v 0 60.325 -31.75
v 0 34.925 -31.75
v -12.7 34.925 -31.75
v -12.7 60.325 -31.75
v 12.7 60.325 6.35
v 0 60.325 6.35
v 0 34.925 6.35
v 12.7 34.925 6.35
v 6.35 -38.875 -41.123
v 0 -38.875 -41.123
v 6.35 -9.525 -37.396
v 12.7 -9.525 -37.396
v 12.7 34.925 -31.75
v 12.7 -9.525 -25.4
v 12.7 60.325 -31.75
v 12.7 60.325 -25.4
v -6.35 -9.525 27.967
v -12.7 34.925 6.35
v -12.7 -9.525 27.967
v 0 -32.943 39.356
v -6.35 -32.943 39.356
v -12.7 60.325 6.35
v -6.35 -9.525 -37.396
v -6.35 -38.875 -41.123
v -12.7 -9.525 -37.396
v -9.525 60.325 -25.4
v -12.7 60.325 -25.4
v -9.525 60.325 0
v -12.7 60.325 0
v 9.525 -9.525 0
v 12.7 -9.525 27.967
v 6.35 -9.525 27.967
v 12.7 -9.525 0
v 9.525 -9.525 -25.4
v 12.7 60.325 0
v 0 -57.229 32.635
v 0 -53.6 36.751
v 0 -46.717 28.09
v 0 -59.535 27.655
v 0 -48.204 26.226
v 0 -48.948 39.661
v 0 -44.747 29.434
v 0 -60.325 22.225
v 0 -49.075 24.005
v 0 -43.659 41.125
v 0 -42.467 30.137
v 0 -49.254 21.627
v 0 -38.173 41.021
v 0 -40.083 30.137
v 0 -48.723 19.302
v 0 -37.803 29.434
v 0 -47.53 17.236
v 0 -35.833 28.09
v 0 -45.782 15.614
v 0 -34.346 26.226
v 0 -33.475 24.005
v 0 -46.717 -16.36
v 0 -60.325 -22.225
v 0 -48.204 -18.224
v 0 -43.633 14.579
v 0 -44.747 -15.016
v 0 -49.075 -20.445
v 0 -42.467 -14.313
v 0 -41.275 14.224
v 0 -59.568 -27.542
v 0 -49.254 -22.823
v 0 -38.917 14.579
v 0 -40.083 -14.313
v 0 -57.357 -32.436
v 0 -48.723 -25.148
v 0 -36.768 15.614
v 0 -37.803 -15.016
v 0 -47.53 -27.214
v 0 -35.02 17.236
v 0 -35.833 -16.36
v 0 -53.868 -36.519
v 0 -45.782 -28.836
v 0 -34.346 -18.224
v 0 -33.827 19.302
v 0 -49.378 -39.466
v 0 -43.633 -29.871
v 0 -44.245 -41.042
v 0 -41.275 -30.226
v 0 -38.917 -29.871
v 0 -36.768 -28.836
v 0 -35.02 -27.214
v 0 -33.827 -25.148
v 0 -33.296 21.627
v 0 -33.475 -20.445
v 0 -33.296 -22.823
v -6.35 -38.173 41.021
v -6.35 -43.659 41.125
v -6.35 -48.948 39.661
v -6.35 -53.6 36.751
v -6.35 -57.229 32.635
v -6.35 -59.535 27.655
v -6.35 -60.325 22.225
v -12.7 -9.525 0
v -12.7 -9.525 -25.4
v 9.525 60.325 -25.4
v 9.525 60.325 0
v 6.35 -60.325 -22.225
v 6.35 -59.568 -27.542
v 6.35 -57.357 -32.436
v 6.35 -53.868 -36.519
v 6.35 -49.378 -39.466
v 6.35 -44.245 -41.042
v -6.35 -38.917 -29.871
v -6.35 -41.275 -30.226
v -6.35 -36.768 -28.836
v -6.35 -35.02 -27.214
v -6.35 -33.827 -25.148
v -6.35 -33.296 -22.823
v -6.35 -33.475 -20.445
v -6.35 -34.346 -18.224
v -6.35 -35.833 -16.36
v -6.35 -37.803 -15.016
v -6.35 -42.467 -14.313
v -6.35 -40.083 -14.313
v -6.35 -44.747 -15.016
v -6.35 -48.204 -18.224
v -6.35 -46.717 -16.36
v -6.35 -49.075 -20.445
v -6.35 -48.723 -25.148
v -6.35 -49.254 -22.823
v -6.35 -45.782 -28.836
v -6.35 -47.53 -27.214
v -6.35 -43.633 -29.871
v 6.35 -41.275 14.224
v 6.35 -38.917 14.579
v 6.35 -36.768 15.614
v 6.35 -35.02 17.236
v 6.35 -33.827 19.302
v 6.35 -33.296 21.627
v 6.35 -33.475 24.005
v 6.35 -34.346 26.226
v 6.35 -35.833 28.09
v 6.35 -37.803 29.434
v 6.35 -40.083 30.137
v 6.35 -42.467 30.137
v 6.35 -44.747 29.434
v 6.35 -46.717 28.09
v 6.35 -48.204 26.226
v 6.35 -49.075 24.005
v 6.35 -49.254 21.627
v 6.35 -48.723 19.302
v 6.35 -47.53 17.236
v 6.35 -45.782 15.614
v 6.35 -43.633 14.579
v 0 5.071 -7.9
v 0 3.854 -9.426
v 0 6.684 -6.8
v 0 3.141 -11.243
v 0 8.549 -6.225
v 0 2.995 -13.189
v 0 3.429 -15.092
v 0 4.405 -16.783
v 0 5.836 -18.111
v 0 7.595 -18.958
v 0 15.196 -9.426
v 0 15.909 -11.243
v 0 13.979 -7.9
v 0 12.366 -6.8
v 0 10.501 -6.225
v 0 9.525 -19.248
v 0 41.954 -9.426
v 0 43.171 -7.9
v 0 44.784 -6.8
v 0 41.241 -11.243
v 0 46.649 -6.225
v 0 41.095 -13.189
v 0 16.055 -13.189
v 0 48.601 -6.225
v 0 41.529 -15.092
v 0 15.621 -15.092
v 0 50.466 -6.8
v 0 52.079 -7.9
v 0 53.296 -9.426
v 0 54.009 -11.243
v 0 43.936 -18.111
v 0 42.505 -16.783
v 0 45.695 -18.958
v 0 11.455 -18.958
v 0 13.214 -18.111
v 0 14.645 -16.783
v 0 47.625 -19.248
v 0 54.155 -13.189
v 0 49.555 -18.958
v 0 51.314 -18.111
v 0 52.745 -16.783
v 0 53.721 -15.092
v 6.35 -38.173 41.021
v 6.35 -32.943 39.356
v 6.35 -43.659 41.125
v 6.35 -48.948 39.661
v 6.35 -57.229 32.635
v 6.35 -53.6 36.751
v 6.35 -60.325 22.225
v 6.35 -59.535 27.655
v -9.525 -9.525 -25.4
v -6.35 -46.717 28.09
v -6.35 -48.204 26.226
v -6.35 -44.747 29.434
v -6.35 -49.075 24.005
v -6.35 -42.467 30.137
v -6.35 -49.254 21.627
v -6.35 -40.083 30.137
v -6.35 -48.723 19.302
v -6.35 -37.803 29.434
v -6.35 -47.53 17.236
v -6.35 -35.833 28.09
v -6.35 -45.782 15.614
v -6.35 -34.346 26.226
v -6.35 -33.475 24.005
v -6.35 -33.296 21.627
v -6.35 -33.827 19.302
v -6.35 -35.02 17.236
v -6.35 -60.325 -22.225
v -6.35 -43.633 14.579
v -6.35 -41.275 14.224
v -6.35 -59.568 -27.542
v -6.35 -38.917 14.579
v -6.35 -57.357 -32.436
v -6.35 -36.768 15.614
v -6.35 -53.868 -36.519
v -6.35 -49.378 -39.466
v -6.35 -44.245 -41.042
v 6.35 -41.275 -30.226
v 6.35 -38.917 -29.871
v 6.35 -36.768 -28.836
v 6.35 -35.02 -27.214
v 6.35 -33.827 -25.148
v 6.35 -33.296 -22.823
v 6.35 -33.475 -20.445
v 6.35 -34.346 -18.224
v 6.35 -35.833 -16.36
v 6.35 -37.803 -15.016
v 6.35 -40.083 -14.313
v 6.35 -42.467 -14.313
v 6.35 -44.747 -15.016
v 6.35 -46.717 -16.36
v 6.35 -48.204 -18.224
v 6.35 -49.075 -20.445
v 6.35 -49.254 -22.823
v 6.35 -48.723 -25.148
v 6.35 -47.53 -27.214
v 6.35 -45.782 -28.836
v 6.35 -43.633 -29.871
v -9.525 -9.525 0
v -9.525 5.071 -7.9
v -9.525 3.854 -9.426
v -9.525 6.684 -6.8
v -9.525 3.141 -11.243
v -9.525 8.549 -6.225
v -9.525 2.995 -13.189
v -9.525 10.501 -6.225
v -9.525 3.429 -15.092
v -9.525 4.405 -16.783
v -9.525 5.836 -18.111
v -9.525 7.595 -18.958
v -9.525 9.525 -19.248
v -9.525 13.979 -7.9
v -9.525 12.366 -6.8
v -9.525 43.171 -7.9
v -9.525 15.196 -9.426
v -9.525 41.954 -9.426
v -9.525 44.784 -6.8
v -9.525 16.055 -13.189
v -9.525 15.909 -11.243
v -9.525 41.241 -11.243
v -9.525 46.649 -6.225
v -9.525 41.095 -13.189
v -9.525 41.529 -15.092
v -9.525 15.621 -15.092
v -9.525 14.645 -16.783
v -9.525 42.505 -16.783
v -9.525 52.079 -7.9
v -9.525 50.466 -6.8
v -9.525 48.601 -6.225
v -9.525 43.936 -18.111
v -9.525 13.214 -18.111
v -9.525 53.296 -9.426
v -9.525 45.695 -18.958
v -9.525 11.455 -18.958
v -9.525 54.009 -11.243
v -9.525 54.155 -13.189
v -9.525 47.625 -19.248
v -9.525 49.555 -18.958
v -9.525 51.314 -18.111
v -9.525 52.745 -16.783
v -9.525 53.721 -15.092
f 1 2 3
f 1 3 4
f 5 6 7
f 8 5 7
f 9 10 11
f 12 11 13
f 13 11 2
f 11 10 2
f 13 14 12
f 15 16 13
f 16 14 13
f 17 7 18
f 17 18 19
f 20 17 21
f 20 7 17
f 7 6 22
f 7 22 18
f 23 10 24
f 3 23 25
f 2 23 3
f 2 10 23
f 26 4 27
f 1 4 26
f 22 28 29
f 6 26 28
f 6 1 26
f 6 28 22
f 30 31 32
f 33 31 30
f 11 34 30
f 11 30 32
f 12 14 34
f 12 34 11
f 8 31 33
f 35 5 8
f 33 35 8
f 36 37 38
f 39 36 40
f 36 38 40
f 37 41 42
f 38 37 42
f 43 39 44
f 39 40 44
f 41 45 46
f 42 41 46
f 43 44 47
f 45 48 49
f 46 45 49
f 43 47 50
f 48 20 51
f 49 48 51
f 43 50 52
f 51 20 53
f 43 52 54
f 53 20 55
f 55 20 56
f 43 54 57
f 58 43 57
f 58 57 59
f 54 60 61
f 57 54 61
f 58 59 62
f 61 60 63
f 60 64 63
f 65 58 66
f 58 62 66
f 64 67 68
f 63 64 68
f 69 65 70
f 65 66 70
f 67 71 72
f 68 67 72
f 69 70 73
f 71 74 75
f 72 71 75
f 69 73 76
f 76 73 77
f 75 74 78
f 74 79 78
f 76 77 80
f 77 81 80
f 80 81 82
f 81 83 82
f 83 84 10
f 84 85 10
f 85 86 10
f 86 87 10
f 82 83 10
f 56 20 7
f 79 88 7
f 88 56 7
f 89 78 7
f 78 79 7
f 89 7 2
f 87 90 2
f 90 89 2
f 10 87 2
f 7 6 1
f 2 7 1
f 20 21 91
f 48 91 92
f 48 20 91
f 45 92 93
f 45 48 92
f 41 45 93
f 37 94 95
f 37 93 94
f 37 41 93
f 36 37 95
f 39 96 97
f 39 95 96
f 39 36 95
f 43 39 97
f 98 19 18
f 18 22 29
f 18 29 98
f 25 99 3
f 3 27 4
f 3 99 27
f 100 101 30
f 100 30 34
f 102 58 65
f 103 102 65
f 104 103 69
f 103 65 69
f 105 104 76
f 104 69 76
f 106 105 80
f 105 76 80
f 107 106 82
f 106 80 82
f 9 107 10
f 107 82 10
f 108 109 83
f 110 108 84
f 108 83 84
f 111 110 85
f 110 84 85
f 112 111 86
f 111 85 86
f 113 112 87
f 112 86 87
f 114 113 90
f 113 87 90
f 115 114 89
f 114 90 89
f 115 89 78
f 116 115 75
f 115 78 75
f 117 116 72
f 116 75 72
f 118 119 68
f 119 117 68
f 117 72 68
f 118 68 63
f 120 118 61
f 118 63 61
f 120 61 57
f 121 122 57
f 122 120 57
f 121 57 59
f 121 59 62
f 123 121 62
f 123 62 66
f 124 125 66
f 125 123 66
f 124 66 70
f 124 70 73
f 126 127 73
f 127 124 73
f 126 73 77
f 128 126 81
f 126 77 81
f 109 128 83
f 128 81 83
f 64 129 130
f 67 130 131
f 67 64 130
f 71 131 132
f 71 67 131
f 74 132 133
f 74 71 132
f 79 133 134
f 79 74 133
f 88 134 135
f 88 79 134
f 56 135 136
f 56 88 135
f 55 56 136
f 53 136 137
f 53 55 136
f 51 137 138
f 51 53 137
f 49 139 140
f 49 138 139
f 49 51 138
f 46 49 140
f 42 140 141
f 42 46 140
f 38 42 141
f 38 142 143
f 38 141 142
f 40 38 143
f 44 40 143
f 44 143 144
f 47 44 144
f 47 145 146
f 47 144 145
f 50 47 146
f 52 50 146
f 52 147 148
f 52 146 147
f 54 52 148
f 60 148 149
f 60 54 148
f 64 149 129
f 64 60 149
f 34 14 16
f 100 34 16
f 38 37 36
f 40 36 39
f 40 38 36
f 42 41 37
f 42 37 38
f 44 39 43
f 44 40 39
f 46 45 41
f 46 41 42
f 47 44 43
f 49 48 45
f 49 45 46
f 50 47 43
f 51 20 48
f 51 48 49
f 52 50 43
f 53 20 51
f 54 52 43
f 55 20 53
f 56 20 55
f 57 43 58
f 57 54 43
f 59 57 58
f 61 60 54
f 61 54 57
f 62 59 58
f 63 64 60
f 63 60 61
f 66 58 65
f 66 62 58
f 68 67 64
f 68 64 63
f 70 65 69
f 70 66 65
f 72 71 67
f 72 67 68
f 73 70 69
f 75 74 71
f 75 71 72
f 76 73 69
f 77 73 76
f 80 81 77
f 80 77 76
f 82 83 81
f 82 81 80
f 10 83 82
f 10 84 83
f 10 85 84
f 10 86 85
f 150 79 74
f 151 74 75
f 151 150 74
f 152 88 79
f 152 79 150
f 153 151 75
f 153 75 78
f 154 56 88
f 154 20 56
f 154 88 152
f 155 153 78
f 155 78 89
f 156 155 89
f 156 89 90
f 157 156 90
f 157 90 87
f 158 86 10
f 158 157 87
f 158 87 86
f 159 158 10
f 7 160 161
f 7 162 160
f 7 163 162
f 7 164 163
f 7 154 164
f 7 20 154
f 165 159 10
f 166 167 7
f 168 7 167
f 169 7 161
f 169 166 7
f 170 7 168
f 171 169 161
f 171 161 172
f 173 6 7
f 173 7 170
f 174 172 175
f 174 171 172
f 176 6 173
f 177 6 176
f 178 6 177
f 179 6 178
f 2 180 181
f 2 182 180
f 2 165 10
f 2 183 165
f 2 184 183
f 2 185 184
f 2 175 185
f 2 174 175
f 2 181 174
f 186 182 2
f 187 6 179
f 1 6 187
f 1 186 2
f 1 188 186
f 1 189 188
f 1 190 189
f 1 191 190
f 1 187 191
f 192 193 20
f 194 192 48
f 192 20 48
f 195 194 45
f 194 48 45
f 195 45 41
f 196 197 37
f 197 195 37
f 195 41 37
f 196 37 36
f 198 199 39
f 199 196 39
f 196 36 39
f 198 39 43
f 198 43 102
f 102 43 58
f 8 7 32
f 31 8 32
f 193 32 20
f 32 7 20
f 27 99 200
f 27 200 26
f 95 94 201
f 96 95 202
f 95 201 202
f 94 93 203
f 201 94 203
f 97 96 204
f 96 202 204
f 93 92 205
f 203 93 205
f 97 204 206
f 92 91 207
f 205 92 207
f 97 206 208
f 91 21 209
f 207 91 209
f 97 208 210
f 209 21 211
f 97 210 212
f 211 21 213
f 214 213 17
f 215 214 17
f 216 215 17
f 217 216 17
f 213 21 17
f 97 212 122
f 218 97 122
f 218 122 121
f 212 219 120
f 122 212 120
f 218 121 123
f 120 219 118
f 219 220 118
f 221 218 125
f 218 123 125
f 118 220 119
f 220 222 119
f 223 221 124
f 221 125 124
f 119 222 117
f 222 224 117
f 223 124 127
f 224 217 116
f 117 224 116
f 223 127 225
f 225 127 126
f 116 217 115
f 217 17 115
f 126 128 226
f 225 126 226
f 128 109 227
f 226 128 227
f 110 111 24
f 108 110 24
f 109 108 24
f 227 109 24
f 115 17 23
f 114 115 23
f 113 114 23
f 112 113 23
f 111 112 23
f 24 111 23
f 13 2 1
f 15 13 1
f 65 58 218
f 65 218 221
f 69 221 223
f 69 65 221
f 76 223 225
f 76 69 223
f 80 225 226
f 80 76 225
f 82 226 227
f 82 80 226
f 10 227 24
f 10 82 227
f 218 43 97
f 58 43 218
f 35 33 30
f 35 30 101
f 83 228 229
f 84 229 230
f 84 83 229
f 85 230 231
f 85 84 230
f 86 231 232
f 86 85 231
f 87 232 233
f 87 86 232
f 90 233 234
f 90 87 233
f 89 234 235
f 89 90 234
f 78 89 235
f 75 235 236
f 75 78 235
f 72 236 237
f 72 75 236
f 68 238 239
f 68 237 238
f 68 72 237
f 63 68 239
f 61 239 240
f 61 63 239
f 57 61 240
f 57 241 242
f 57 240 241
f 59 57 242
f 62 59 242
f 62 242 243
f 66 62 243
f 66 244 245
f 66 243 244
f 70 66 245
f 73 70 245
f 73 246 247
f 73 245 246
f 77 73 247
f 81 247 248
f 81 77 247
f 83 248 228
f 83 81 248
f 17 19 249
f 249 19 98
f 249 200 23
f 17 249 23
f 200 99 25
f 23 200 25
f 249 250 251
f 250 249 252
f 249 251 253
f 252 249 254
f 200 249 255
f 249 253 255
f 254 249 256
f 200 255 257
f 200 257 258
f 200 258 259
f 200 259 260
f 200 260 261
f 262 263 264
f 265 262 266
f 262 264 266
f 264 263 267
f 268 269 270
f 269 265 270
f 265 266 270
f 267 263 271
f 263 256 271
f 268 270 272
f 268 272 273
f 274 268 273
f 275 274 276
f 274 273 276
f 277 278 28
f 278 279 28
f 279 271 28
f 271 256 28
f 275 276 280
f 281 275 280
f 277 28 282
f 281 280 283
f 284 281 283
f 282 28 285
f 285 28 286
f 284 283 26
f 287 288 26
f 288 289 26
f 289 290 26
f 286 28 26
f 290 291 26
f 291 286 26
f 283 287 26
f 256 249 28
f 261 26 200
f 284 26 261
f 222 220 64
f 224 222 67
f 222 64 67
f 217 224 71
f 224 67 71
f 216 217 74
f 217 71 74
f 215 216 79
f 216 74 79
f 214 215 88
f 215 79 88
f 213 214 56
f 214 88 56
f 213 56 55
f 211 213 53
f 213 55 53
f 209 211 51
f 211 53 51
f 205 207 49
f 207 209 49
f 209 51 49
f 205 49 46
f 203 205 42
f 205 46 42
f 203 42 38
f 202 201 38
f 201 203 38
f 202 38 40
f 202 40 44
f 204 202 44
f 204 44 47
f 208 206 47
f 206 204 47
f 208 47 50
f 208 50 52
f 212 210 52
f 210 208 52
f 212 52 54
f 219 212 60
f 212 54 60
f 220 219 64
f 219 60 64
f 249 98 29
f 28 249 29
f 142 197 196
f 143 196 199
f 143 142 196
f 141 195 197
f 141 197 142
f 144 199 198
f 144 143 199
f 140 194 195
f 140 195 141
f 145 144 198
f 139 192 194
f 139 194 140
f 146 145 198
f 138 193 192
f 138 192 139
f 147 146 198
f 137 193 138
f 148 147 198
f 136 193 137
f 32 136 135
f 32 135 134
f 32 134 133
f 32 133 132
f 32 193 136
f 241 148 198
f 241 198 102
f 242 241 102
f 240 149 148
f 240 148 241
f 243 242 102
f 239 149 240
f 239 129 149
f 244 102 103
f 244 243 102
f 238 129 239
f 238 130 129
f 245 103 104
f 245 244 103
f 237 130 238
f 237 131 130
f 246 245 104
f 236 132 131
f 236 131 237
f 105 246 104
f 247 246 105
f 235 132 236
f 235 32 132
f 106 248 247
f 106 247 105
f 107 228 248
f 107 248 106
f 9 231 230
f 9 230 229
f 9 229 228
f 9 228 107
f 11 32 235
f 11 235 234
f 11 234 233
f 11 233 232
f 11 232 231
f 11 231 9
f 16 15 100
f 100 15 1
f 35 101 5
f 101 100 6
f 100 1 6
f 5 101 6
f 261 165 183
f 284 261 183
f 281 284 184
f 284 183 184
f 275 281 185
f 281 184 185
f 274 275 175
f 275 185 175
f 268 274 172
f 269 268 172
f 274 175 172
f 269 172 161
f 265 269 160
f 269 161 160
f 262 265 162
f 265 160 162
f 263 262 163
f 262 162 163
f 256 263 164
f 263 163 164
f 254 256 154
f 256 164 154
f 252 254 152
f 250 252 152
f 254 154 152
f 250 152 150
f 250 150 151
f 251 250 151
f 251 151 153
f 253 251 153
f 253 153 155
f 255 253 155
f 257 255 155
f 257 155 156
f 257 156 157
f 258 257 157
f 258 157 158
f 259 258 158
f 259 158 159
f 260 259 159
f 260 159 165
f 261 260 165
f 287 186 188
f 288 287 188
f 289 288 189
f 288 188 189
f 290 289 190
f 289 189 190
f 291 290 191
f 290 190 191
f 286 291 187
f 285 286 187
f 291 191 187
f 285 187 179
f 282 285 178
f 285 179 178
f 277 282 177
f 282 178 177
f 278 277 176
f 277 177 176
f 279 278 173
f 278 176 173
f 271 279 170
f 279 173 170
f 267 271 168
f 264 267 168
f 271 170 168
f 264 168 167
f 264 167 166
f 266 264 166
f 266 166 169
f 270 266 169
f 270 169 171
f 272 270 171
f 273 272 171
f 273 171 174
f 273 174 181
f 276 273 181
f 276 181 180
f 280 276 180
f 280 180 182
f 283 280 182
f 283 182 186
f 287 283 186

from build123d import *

# Parameters (mm, degrees)
SKETCH1_R           = 8.001
BOSS_EXTRUDE1_DEPTH = 12.7
SKETCH2_W           = 127.926153114
SKETCH2_H           = 63.5
CUT_EXTRUDE1_DEPTH  = 6.35
SKETCH2_3_W         = 25.4
SKETCH2_3_H         = 69.85
CUT_EXTRUDE2_DEPTH  = 3.175
SKETCH3_R           = 6.5484375
CUT_EXTRUDE3_DEPTH  = 75.189091179


with BuildPart() as part:
    # Sketch1 → Boss-Extrude1 (new body)
    with BuildSketch(Plane(origin=(0, 0, 0), x_dir=(0, 0, -1), z_dir=(1, 0, 0))):
        with BuildLine():
            Line((-6.35, 34.925), (-39.356480762, -32.943441508))
            ThreePointArc((-39.356480762, -32.943441508), (-38.374592708, -51.379115764), (-22.225, -60.325))
            Line((-22.225, -60.325), (22.225, -60.325))
            ThreePointArc((22.225, -60.325), (36.518824209, -53.86821601), (41.123185394, -38.874773174))
            Line((41.123185394, -38.874773174), (31.75, 34.925))
            Line((31.75, 34.925), (31.75, 60.325))
            Line((31.75, 60.325), (-6.35, 60.325))
            Line((-6.35, 60.325), (-6.35, 34.925))
        make_face()
        with Locations((-22.225, -41.275)):
            Circle(SKETCH1_R, mode=Mode.SUBTRACT)
        with Locations((22.225, -41.275)):
            Circle(SKETCH1_R, mode=Mode.SUBTRACT)
    extrude(amount=BOSS_EXTRUDE1_DEPTH)

    # Sketch2 → Cut-Extrude1 (cut)
    with BuildSketch(Plane(origin=(12.7, 0, 0), x_dir=(0, 0, -1), z_dir=(1, 0, 0))):
        with Locations((0, -41.275)):
            Rectangle(SKETCH2_W, SKETCH2_H)
    extrude(amount=-CUT_EXTRUDE1_DEPTH, mode=Mode.SUBTRACT)

    # Sketch2<3> → Cut-Extrude2 (cut)
    with BuildSketch(Plane(origin=(12.7, 0, 0), x_dir=(0, 0, -1), z_dir=(1, 0, 0))):
        with Locations((12.7, 25.4)):
            Rectangle(SKETCH2_3_W, SKETCH2_3_H)
    extrude(amount=-CUT_EXTRUDE2_DEPTH, mode=Mode.SUBTRACT)


with BuildPart() as body_2:
    # Mirror1: mirrored copy
    add(part.part.mirror(Plane(origin=(0, 0, 0), x_dir=(0, 0, 1), z_dir=(1, 0, 0))))

    # Sketch3 → Cut-Extrude3 (cut, through all)
    with BuildSketch(Plane(origin=(0, 0, 0), x_dir=(0, 0, -1), z_dir=(1, 0, 0))):
        with Locations((12.7, 9.525)):
            Circle(SKETCH3_R)
        with Locations((12.7, 47.625)):
            Circle(SKETCH3_R)
    extrude(amount=-CUT_EXTRUDE3_DEPTH, mode=Mode.SUBTRACT)


solid = Compound([part.part, body_2.part])
